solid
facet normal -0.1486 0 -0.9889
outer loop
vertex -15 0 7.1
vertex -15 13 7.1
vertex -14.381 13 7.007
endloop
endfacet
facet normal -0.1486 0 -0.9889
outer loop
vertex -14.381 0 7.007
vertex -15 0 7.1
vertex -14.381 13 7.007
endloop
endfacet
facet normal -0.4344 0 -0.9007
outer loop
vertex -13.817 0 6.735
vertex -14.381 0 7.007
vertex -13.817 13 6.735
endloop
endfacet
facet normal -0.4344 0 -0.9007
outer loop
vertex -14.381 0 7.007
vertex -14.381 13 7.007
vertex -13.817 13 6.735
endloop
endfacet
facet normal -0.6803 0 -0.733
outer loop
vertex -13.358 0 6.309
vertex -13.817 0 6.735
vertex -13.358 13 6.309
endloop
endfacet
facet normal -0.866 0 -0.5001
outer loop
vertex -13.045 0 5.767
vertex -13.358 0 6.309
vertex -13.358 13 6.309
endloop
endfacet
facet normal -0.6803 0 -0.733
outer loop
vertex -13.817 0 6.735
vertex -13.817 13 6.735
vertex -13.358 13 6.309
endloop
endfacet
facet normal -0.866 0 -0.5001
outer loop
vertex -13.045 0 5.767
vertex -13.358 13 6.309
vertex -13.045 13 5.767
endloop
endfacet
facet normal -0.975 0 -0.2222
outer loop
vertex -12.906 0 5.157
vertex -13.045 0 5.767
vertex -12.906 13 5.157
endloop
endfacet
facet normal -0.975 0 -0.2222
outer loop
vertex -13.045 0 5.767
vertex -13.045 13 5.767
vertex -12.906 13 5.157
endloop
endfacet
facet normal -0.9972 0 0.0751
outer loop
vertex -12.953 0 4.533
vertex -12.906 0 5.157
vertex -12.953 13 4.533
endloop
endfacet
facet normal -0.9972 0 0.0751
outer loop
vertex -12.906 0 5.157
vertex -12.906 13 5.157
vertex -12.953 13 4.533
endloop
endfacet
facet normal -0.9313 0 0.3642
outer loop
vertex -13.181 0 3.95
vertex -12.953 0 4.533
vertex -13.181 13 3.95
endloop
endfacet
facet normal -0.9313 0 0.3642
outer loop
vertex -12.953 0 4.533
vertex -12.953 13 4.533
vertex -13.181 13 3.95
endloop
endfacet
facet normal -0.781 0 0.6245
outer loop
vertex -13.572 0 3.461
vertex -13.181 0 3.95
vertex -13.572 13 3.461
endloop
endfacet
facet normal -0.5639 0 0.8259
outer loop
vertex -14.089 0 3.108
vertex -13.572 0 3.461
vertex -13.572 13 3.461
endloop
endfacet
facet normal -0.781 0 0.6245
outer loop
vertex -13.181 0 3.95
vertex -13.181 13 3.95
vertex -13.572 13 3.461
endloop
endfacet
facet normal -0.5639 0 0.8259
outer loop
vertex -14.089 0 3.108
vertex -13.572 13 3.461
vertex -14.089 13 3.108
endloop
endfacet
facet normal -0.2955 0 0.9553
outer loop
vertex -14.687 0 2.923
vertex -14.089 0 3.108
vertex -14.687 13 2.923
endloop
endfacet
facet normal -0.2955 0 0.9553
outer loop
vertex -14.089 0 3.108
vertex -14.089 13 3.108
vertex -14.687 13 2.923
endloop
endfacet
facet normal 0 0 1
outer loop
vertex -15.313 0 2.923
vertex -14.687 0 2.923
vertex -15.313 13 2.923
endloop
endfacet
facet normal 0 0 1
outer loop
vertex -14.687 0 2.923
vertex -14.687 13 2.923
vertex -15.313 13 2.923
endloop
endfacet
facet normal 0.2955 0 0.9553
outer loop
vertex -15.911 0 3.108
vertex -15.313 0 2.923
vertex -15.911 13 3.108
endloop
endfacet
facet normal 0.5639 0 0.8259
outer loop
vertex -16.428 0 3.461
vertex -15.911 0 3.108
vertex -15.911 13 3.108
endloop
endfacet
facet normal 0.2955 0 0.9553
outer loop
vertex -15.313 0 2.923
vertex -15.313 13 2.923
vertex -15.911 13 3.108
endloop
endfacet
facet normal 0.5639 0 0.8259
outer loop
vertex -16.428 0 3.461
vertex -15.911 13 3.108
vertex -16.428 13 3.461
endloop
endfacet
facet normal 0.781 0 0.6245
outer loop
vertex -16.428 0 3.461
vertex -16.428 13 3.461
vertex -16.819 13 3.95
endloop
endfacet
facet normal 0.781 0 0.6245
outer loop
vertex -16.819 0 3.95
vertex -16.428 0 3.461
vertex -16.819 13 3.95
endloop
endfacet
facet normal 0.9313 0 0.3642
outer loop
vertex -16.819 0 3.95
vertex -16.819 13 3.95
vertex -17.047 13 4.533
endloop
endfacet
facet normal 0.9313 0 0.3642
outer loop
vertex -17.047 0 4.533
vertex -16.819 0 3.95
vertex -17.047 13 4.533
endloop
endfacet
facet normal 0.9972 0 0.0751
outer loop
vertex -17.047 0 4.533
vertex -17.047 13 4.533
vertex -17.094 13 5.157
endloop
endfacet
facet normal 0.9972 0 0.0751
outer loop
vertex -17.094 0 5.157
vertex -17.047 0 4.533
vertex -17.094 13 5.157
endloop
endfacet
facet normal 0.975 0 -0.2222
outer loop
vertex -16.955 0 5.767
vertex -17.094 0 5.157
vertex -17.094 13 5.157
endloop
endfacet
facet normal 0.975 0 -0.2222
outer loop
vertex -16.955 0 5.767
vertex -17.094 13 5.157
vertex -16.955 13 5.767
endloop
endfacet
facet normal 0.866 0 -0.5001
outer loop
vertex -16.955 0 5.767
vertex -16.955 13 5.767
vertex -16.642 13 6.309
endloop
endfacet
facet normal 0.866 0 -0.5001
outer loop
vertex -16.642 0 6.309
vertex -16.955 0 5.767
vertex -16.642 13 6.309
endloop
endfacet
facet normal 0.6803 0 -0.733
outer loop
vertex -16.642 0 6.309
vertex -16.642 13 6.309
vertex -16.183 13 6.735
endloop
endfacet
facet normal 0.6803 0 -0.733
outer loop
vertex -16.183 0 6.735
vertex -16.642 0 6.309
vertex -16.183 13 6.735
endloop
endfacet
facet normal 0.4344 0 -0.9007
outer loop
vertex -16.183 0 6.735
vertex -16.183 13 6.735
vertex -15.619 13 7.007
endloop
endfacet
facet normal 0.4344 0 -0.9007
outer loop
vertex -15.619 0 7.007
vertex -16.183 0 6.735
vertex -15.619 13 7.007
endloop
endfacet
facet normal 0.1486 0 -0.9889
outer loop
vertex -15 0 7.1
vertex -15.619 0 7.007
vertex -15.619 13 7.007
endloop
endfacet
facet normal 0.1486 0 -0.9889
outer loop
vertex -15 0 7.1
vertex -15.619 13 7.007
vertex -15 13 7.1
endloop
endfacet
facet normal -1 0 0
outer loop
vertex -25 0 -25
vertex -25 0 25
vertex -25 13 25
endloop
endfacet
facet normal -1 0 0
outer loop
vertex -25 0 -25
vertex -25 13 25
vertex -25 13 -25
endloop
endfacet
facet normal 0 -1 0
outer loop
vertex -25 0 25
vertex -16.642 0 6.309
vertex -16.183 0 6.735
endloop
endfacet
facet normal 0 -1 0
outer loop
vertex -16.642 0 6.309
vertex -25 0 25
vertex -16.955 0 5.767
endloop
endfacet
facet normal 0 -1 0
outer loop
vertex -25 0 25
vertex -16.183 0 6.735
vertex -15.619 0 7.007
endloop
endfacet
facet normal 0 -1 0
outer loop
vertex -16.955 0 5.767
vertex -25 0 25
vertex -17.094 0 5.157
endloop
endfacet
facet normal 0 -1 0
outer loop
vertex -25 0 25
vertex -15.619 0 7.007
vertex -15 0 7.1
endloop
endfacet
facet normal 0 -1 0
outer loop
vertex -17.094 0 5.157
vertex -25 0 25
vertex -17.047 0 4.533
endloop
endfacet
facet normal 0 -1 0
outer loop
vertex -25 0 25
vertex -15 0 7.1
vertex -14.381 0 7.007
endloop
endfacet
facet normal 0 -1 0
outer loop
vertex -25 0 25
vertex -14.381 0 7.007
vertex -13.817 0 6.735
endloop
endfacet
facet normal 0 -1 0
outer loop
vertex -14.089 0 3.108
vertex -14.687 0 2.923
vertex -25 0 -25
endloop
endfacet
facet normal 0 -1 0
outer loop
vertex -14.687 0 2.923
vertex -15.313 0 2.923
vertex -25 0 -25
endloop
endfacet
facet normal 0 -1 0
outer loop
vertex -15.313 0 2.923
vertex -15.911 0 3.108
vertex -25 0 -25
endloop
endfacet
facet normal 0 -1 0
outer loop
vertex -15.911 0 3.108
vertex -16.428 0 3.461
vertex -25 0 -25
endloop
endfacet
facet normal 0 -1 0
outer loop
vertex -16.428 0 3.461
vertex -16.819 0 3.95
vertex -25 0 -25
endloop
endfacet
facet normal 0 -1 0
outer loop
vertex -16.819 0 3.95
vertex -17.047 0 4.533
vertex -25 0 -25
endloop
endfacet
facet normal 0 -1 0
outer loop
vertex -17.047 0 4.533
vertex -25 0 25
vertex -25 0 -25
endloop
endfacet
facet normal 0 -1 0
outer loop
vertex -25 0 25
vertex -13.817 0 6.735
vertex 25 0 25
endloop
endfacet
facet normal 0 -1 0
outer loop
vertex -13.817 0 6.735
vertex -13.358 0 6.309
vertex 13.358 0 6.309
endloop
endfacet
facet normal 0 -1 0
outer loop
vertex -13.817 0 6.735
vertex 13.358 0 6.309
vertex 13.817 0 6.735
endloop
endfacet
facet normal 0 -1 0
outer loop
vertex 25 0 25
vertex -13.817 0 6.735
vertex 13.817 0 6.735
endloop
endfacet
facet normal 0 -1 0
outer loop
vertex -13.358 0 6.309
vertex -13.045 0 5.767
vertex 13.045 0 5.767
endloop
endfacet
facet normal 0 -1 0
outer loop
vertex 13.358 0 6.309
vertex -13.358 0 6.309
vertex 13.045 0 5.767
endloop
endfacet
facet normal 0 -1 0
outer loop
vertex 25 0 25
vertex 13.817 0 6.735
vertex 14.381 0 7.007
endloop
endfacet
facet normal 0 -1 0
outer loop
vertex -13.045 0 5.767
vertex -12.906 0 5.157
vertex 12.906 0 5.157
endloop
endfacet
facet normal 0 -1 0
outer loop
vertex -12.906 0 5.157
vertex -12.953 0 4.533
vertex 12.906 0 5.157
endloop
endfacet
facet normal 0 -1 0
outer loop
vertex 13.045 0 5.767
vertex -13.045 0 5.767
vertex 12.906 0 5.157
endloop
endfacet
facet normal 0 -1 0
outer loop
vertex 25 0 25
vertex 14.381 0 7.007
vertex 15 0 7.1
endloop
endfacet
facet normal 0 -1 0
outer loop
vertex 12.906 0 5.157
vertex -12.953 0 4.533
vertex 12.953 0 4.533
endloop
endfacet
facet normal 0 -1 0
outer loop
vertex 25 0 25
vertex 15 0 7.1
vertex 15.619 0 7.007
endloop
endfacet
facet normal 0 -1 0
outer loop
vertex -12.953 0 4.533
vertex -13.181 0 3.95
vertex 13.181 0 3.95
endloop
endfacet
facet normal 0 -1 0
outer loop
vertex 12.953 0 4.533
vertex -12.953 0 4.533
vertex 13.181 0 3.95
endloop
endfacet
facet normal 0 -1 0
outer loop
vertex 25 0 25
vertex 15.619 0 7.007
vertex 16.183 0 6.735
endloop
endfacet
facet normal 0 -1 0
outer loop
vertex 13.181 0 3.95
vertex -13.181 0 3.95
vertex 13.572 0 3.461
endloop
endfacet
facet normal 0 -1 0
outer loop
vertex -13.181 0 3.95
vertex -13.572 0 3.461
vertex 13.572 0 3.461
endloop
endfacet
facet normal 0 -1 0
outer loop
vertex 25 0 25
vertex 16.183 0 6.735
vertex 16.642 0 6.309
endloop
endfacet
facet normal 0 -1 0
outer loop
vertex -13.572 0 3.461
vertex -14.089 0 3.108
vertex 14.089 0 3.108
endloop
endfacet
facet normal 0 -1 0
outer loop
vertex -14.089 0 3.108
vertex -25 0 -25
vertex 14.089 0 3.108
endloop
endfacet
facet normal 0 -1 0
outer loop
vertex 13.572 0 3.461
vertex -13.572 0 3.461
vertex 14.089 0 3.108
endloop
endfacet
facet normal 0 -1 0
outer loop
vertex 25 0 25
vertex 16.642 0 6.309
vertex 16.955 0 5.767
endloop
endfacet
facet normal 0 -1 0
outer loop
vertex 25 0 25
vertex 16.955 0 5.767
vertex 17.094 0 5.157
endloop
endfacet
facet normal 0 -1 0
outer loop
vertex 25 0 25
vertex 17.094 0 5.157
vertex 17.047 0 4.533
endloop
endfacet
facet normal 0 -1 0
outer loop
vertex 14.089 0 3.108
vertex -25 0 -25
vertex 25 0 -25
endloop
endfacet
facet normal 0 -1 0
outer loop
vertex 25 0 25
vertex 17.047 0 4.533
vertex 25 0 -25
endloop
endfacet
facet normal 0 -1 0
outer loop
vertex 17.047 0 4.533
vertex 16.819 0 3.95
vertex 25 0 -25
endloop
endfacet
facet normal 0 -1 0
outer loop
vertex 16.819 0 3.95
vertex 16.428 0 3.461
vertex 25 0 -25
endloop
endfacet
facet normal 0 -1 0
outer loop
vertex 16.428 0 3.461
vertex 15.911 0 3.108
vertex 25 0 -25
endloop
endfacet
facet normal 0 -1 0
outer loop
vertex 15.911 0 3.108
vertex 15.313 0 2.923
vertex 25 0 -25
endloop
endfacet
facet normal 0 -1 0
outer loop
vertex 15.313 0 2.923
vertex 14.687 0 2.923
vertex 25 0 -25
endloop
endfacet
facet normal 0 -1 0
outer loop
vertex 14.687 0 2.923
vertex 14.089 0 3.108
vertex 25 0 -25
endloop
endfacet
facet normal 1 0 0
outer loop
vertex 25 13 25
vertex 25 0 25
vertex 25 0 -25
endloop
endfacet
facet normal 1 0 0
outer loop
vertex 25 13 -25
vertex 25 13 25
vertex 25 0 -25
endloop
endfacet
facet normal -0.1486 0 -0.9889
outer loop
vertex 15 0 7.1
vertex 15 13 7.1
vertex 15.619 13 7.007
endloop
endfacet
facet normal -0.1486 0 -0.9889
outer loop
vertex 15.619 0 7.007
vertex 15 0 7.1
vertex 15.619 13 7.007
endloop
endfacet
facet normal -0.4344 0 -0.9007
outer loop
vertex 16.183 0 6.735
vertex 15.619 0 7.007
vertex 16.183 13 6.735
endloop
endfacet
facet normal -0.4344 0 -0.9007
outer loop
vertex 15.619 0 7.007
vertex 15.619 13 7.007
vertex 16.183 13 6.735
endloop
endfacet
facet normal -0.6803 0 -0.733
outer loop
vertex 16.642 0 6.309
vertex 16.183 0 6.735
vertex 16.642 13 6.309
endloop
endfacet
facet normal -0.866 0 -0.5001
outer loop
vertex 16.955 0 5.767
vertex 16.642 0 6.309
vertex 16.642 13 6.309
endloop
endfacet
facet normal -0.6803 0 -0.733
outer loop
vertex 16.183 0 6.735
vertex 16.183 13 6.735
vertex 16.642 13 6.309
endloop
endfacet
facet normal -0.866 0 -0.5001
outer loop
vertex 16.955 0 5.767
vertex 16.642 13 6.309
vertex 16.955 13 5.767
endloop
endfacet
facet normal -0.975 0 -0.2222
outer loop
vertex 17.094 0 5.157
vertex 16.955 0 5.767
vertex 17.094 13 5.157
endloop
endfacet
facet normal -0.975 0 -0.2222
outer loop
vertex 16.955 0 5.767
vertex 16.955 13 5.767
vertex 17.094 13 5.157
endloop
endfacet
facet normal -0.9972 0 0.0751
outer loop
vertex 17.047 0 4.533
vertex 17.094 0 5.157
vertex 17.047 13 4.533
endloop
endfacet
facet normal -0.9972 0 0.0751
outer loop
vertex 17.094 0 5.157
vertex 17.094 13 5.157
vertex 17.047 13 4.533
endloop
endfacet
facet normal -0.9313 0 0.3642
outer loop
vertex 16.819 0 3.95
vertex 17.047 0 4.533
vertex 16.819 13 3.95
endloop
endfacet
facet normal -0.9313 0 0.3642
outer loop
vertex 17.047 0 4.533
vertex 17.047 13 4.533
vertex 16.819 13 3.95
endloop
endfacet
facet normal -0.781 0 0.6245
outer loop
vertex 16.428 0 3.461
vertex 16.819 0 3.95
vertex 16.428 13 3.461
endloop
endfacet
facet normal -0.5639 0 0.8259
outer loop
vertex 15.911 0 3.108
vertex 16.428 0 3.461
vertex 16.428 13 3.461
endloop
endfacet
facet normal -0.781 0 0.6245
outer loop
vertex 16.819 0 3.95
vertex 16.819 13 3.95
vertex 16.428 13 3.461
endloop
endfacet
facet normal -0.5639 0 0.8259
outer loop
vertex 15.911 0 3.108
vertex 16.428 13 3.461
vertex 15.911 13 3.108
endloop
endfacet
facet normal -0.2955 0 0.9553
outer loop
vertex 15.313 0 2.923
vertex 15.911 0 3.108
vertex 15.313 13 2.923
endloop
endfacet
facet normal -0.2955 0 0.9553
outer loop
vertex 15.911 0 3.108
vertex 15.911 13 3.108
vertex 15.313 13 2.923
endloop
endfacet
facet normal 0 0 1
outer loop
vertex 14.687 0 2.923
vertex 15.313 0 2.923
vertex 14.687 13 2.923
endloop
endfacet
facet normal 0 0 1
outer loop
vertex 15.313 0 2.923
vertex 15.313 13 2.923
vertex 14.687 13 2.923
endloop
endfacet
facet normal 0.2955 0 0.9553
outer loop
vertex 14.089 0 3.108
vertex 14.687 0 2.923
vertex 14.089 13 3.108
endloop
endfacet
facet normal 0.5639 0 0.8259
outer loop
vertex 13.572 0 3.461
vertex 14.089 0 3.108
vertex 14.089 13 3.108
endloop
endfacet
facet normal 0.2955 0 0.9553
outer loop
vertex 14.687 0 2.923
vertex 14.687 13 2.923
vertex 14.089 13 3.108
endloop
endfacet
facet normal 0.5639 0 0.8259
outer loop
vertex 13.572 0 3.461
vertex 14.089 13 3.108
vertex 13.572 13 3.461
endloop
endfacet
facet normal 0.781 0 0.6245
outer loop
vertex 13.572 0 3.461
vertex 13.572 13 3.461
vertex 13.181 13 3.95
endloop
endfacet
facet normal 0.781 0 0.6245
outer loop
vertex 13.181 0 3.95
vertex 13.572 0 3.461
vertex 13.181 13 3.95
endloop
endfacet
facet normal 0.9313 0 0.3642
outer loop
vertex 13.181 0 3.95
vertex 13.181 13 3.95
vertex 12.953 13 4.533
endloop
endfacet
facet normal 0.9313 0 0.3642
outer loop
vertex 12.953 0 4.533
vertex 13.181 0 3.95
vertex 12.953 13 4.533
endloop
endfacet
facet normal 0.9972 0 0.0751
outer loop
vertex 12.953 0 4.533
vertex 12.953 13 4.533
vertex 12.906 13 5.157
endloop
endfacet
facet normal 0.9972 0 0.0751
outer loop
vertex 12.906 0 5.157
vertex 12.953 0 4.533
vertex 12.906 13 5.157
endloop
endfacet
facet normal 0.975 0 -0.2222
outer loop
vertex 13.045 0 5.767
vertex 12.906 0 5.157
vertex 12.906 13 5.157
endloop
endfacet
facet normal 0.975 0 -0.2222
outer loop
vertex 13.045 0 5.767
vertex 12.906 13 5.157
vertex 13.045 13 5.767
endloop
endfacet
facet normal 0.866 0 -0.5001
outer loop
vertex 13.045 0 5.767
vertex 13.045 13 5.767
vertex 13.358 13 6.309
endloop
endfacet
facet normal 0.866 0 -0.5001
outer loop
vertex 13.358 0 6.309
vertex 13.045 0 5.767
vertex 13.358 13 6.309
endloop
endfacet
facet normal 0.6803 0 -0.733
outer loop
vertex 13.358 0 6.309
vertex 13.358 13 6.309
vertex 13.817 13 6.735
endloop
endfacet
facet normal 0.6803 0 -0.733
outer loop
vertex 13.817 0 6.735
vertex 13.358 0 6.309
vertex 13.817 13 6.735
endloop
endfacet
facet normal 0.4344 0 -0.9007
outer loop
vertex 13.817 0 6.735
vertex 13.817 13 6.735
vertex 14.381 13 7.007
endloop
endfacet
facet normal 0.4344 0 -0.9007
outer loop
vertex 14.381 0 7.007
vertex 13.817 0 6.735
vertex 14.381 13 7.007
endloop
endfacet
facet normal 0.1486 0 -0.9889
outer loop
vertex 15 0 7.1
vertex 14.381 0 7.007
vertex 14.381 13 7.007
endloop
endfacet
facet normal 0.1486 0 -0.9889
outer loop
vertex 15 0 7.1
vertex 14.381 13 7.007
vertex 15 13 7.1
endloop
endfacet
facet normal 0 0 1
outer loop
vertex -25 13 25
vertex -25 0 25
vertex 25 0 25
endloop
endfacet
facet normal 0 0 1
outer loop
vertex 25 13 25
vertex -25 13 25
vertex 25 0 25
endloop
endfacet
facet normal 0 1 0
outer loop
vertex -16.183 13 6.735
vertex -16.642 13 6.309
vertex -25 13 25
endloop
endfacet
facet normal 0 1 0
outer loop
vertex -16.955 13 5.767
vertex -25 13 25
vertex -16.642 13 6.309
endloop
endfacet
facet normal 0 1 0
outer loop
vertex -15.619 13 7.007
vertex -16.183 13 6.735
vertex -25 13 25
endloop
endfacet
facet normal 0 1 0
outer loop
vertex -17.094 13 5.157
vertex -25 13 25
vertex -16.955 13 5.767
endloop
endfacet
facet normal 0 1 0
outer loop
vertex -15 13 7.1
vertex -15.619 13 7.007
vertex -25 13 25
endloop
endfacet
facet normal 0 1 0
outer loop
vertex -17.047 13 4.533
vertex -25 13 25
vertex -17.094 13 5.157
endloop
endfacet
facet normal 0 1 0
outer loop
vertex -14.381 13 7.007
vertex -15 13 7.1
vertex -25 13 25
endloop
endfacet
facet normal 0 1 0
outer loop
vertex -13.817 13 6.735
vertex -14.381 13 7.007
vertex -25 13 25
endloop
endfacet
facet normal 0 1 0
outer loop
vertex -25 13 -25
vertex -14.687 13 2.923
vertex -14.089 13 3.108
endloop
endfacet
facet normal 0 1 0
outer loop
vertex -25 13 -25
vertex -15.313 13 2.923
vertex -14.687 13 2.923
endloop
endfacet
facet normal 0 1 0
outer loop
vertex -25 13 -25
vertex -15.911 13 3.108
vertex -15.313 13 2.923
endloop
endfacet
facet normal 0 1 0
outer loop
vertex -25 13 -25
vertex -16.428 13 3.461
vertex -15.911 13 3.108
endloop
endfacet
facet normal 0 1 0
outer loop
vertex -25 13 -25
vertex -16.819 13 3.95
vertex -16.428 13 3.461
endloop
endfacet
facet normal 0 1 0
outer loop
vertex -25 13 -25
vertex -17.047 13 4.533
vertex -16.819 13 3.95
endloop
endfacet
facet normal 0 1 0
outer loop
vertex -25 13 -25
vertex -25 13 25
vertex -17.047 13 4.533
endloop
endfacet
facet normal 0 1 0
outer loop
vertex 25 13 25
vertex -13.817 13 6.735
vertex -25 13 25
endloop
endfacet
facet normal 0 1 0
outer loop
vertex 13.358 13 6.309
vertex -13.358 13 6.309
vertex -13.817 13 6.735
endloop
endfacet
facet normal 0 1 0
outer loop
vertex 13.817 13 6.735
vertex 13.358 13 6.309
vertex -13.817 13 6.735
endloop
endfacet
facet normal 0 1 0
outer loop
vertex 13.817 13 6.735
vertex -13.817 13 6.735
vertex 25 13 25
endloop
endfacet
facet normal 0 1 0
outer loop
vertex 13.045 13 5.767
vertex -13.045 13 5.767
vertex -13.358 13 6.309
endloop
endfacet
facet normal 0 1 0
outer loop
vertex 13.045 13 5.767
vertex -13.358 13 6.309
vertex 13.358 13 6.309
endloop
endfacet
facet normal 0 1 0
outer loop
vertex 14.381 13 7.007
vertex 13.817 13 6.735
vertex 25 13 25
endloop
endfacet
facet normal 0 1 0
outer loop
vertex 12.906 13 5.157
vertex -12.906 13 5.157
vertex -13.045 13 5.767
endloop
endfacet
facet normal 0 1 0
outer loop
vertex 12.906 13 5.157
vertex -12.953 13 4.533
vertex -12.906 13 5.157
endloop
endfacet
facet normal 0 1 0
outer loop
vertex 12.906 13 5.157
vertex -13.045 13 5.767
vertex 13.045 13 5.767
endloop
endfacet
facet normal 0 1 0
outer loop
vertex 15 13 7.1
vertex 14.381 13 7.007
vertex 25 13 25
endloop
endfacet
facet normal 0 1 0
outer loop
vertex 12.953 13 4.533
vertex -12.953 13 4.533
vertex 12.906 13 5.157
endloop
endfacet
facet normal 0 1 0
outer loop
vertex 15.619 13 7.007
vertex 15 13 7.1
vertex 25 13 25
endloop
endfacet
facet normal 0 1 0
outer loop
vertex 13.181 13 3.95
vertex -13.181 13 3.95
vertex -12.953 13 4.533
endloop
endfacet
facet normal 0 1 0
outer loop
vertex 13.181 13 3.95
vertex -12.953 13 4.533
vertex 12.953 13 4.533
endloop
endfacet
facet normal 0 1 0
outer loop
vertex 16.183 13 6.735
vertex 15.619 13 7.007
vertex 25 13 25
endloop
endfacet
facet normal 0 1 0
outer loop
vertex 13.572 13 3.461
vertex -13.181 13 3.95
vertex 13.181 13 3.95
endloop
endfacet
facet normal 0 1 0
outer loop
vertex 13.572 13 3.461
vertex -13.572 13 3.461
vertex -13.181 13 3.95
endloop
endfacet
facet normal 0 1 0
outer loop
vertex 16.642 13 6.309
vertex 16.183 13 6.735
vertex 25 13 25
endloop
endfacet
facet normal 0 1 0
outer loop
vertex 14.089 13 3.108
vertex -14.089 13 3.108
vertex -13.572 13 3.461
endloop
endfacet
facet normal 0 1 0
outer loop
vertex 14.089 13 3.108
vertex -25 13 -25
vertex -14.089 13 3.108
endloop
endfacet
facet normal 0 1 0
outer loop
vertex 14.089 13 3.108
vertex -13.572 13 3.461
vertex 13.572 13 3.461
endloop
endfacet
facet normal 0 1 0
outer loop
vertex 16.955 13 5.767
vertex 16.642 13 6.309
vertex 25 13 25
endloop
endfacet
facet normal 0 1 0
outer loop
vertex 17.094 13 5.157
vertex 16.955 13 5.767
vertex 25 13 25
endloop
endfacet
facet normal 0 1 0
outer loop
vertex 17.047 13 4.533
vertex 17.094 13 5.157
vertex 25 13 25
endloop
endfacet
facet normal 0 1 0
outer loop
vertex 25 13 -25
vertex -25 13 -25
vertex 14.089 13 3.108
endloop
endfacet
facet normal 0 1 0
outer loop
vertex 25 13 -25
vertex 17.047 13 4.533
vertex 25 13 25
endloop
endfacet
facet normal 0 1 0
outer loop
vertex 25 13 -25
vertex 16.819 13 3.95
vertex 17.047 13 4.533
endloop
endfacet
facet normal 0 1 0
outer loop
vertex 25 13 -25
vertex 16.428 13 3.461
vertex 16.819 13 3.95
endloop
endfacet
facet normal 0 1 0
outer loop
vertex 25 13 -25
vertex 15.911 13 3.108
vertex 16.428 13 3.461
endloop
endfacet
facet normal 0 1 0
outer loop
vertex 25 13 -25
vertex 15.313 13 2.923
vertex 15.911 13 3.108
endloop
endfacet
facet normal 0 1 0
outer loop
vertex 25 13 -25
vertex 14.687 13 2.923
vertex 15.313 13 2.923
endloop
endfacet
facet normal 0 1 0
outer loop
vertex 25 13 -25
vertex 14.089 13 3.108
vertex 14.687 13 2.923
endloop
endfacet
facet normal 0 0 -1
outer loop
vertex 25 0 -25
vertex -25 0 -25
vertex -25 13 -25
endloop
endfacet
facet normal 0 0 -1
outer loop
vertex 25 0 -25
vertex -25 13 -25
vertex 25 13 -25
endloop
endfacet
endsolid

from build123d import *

# Parameters (mm, degrees)
SKETCH_1_W          = 50
SKETCH_1_H          = 50
EXTRUDE_1_DEPTH     = 13
CUT_EXTRUDE_1_REACH = 39.67
SKETCH_3_R          = 2.1


with BuildPart() as part:
    # 草图1 → 凸台-拉伸1 (new body)
    with BuildSketch(Plane(origin=(0, 0, 0), x_dir=(1, 0, 0), z_dir=(0, 1, 0))):
        Rectangle(SKETCH_1_W, SKETCH_1_H)
    extrude(amount=EXTRUDE_1_DEPTH)

    # 草图3 → 切除-拉伸1 (cut, up to next)
    with BuildSketch(Plane(origin=(0, 13, 0), x_dir=(1, 0, 0), z_dir=(0, 1, 0)), mode=Mode.PRIVATE) as cut_extrude_1_sk1:
        with Locations(Location((-15, -5, 0), (0, 0, 270))):
            Circle(SKETCH_3_R)
    cut_extrude_1_tool1 = extrude(cut_extrude_1_sk1.sketch, amount=-CUT_EXTRUDE_1_REACH, mode=Mode.PRIVATE) & part.part
    # 草图3 → 切除-拉伸1 (cut, up to next)
    with BuildSketch(Plane(origin=(0, 13, 0), x_dir=(1, 0, 0), z_dir=(0, 1, 0)), mode=Mode.PRIVATE) as cut_extrude_1_sk2:
        with Locations(Location((15, -5, 0), (0, 0, 270))):
            Circle(SKETCH_3_R)
    cut_extrude_1_tool2 = extrude(cut_extrude_1_sk2.sketch, amount=-CUT_EXTRUDE_1_REACH, mode=Mode.PRIVATE) & part.part
    add(cut_extrude_1_tool1.solids().sort_by_distance((-15, 13, 5))[0], mode=Mode.SUBTRACT)
    add(cut_extrude_1_tool2.solids().sort_by_distance((15, 13, 5))[0], mode=Mode.SUBTRACT)


solid = part.part
